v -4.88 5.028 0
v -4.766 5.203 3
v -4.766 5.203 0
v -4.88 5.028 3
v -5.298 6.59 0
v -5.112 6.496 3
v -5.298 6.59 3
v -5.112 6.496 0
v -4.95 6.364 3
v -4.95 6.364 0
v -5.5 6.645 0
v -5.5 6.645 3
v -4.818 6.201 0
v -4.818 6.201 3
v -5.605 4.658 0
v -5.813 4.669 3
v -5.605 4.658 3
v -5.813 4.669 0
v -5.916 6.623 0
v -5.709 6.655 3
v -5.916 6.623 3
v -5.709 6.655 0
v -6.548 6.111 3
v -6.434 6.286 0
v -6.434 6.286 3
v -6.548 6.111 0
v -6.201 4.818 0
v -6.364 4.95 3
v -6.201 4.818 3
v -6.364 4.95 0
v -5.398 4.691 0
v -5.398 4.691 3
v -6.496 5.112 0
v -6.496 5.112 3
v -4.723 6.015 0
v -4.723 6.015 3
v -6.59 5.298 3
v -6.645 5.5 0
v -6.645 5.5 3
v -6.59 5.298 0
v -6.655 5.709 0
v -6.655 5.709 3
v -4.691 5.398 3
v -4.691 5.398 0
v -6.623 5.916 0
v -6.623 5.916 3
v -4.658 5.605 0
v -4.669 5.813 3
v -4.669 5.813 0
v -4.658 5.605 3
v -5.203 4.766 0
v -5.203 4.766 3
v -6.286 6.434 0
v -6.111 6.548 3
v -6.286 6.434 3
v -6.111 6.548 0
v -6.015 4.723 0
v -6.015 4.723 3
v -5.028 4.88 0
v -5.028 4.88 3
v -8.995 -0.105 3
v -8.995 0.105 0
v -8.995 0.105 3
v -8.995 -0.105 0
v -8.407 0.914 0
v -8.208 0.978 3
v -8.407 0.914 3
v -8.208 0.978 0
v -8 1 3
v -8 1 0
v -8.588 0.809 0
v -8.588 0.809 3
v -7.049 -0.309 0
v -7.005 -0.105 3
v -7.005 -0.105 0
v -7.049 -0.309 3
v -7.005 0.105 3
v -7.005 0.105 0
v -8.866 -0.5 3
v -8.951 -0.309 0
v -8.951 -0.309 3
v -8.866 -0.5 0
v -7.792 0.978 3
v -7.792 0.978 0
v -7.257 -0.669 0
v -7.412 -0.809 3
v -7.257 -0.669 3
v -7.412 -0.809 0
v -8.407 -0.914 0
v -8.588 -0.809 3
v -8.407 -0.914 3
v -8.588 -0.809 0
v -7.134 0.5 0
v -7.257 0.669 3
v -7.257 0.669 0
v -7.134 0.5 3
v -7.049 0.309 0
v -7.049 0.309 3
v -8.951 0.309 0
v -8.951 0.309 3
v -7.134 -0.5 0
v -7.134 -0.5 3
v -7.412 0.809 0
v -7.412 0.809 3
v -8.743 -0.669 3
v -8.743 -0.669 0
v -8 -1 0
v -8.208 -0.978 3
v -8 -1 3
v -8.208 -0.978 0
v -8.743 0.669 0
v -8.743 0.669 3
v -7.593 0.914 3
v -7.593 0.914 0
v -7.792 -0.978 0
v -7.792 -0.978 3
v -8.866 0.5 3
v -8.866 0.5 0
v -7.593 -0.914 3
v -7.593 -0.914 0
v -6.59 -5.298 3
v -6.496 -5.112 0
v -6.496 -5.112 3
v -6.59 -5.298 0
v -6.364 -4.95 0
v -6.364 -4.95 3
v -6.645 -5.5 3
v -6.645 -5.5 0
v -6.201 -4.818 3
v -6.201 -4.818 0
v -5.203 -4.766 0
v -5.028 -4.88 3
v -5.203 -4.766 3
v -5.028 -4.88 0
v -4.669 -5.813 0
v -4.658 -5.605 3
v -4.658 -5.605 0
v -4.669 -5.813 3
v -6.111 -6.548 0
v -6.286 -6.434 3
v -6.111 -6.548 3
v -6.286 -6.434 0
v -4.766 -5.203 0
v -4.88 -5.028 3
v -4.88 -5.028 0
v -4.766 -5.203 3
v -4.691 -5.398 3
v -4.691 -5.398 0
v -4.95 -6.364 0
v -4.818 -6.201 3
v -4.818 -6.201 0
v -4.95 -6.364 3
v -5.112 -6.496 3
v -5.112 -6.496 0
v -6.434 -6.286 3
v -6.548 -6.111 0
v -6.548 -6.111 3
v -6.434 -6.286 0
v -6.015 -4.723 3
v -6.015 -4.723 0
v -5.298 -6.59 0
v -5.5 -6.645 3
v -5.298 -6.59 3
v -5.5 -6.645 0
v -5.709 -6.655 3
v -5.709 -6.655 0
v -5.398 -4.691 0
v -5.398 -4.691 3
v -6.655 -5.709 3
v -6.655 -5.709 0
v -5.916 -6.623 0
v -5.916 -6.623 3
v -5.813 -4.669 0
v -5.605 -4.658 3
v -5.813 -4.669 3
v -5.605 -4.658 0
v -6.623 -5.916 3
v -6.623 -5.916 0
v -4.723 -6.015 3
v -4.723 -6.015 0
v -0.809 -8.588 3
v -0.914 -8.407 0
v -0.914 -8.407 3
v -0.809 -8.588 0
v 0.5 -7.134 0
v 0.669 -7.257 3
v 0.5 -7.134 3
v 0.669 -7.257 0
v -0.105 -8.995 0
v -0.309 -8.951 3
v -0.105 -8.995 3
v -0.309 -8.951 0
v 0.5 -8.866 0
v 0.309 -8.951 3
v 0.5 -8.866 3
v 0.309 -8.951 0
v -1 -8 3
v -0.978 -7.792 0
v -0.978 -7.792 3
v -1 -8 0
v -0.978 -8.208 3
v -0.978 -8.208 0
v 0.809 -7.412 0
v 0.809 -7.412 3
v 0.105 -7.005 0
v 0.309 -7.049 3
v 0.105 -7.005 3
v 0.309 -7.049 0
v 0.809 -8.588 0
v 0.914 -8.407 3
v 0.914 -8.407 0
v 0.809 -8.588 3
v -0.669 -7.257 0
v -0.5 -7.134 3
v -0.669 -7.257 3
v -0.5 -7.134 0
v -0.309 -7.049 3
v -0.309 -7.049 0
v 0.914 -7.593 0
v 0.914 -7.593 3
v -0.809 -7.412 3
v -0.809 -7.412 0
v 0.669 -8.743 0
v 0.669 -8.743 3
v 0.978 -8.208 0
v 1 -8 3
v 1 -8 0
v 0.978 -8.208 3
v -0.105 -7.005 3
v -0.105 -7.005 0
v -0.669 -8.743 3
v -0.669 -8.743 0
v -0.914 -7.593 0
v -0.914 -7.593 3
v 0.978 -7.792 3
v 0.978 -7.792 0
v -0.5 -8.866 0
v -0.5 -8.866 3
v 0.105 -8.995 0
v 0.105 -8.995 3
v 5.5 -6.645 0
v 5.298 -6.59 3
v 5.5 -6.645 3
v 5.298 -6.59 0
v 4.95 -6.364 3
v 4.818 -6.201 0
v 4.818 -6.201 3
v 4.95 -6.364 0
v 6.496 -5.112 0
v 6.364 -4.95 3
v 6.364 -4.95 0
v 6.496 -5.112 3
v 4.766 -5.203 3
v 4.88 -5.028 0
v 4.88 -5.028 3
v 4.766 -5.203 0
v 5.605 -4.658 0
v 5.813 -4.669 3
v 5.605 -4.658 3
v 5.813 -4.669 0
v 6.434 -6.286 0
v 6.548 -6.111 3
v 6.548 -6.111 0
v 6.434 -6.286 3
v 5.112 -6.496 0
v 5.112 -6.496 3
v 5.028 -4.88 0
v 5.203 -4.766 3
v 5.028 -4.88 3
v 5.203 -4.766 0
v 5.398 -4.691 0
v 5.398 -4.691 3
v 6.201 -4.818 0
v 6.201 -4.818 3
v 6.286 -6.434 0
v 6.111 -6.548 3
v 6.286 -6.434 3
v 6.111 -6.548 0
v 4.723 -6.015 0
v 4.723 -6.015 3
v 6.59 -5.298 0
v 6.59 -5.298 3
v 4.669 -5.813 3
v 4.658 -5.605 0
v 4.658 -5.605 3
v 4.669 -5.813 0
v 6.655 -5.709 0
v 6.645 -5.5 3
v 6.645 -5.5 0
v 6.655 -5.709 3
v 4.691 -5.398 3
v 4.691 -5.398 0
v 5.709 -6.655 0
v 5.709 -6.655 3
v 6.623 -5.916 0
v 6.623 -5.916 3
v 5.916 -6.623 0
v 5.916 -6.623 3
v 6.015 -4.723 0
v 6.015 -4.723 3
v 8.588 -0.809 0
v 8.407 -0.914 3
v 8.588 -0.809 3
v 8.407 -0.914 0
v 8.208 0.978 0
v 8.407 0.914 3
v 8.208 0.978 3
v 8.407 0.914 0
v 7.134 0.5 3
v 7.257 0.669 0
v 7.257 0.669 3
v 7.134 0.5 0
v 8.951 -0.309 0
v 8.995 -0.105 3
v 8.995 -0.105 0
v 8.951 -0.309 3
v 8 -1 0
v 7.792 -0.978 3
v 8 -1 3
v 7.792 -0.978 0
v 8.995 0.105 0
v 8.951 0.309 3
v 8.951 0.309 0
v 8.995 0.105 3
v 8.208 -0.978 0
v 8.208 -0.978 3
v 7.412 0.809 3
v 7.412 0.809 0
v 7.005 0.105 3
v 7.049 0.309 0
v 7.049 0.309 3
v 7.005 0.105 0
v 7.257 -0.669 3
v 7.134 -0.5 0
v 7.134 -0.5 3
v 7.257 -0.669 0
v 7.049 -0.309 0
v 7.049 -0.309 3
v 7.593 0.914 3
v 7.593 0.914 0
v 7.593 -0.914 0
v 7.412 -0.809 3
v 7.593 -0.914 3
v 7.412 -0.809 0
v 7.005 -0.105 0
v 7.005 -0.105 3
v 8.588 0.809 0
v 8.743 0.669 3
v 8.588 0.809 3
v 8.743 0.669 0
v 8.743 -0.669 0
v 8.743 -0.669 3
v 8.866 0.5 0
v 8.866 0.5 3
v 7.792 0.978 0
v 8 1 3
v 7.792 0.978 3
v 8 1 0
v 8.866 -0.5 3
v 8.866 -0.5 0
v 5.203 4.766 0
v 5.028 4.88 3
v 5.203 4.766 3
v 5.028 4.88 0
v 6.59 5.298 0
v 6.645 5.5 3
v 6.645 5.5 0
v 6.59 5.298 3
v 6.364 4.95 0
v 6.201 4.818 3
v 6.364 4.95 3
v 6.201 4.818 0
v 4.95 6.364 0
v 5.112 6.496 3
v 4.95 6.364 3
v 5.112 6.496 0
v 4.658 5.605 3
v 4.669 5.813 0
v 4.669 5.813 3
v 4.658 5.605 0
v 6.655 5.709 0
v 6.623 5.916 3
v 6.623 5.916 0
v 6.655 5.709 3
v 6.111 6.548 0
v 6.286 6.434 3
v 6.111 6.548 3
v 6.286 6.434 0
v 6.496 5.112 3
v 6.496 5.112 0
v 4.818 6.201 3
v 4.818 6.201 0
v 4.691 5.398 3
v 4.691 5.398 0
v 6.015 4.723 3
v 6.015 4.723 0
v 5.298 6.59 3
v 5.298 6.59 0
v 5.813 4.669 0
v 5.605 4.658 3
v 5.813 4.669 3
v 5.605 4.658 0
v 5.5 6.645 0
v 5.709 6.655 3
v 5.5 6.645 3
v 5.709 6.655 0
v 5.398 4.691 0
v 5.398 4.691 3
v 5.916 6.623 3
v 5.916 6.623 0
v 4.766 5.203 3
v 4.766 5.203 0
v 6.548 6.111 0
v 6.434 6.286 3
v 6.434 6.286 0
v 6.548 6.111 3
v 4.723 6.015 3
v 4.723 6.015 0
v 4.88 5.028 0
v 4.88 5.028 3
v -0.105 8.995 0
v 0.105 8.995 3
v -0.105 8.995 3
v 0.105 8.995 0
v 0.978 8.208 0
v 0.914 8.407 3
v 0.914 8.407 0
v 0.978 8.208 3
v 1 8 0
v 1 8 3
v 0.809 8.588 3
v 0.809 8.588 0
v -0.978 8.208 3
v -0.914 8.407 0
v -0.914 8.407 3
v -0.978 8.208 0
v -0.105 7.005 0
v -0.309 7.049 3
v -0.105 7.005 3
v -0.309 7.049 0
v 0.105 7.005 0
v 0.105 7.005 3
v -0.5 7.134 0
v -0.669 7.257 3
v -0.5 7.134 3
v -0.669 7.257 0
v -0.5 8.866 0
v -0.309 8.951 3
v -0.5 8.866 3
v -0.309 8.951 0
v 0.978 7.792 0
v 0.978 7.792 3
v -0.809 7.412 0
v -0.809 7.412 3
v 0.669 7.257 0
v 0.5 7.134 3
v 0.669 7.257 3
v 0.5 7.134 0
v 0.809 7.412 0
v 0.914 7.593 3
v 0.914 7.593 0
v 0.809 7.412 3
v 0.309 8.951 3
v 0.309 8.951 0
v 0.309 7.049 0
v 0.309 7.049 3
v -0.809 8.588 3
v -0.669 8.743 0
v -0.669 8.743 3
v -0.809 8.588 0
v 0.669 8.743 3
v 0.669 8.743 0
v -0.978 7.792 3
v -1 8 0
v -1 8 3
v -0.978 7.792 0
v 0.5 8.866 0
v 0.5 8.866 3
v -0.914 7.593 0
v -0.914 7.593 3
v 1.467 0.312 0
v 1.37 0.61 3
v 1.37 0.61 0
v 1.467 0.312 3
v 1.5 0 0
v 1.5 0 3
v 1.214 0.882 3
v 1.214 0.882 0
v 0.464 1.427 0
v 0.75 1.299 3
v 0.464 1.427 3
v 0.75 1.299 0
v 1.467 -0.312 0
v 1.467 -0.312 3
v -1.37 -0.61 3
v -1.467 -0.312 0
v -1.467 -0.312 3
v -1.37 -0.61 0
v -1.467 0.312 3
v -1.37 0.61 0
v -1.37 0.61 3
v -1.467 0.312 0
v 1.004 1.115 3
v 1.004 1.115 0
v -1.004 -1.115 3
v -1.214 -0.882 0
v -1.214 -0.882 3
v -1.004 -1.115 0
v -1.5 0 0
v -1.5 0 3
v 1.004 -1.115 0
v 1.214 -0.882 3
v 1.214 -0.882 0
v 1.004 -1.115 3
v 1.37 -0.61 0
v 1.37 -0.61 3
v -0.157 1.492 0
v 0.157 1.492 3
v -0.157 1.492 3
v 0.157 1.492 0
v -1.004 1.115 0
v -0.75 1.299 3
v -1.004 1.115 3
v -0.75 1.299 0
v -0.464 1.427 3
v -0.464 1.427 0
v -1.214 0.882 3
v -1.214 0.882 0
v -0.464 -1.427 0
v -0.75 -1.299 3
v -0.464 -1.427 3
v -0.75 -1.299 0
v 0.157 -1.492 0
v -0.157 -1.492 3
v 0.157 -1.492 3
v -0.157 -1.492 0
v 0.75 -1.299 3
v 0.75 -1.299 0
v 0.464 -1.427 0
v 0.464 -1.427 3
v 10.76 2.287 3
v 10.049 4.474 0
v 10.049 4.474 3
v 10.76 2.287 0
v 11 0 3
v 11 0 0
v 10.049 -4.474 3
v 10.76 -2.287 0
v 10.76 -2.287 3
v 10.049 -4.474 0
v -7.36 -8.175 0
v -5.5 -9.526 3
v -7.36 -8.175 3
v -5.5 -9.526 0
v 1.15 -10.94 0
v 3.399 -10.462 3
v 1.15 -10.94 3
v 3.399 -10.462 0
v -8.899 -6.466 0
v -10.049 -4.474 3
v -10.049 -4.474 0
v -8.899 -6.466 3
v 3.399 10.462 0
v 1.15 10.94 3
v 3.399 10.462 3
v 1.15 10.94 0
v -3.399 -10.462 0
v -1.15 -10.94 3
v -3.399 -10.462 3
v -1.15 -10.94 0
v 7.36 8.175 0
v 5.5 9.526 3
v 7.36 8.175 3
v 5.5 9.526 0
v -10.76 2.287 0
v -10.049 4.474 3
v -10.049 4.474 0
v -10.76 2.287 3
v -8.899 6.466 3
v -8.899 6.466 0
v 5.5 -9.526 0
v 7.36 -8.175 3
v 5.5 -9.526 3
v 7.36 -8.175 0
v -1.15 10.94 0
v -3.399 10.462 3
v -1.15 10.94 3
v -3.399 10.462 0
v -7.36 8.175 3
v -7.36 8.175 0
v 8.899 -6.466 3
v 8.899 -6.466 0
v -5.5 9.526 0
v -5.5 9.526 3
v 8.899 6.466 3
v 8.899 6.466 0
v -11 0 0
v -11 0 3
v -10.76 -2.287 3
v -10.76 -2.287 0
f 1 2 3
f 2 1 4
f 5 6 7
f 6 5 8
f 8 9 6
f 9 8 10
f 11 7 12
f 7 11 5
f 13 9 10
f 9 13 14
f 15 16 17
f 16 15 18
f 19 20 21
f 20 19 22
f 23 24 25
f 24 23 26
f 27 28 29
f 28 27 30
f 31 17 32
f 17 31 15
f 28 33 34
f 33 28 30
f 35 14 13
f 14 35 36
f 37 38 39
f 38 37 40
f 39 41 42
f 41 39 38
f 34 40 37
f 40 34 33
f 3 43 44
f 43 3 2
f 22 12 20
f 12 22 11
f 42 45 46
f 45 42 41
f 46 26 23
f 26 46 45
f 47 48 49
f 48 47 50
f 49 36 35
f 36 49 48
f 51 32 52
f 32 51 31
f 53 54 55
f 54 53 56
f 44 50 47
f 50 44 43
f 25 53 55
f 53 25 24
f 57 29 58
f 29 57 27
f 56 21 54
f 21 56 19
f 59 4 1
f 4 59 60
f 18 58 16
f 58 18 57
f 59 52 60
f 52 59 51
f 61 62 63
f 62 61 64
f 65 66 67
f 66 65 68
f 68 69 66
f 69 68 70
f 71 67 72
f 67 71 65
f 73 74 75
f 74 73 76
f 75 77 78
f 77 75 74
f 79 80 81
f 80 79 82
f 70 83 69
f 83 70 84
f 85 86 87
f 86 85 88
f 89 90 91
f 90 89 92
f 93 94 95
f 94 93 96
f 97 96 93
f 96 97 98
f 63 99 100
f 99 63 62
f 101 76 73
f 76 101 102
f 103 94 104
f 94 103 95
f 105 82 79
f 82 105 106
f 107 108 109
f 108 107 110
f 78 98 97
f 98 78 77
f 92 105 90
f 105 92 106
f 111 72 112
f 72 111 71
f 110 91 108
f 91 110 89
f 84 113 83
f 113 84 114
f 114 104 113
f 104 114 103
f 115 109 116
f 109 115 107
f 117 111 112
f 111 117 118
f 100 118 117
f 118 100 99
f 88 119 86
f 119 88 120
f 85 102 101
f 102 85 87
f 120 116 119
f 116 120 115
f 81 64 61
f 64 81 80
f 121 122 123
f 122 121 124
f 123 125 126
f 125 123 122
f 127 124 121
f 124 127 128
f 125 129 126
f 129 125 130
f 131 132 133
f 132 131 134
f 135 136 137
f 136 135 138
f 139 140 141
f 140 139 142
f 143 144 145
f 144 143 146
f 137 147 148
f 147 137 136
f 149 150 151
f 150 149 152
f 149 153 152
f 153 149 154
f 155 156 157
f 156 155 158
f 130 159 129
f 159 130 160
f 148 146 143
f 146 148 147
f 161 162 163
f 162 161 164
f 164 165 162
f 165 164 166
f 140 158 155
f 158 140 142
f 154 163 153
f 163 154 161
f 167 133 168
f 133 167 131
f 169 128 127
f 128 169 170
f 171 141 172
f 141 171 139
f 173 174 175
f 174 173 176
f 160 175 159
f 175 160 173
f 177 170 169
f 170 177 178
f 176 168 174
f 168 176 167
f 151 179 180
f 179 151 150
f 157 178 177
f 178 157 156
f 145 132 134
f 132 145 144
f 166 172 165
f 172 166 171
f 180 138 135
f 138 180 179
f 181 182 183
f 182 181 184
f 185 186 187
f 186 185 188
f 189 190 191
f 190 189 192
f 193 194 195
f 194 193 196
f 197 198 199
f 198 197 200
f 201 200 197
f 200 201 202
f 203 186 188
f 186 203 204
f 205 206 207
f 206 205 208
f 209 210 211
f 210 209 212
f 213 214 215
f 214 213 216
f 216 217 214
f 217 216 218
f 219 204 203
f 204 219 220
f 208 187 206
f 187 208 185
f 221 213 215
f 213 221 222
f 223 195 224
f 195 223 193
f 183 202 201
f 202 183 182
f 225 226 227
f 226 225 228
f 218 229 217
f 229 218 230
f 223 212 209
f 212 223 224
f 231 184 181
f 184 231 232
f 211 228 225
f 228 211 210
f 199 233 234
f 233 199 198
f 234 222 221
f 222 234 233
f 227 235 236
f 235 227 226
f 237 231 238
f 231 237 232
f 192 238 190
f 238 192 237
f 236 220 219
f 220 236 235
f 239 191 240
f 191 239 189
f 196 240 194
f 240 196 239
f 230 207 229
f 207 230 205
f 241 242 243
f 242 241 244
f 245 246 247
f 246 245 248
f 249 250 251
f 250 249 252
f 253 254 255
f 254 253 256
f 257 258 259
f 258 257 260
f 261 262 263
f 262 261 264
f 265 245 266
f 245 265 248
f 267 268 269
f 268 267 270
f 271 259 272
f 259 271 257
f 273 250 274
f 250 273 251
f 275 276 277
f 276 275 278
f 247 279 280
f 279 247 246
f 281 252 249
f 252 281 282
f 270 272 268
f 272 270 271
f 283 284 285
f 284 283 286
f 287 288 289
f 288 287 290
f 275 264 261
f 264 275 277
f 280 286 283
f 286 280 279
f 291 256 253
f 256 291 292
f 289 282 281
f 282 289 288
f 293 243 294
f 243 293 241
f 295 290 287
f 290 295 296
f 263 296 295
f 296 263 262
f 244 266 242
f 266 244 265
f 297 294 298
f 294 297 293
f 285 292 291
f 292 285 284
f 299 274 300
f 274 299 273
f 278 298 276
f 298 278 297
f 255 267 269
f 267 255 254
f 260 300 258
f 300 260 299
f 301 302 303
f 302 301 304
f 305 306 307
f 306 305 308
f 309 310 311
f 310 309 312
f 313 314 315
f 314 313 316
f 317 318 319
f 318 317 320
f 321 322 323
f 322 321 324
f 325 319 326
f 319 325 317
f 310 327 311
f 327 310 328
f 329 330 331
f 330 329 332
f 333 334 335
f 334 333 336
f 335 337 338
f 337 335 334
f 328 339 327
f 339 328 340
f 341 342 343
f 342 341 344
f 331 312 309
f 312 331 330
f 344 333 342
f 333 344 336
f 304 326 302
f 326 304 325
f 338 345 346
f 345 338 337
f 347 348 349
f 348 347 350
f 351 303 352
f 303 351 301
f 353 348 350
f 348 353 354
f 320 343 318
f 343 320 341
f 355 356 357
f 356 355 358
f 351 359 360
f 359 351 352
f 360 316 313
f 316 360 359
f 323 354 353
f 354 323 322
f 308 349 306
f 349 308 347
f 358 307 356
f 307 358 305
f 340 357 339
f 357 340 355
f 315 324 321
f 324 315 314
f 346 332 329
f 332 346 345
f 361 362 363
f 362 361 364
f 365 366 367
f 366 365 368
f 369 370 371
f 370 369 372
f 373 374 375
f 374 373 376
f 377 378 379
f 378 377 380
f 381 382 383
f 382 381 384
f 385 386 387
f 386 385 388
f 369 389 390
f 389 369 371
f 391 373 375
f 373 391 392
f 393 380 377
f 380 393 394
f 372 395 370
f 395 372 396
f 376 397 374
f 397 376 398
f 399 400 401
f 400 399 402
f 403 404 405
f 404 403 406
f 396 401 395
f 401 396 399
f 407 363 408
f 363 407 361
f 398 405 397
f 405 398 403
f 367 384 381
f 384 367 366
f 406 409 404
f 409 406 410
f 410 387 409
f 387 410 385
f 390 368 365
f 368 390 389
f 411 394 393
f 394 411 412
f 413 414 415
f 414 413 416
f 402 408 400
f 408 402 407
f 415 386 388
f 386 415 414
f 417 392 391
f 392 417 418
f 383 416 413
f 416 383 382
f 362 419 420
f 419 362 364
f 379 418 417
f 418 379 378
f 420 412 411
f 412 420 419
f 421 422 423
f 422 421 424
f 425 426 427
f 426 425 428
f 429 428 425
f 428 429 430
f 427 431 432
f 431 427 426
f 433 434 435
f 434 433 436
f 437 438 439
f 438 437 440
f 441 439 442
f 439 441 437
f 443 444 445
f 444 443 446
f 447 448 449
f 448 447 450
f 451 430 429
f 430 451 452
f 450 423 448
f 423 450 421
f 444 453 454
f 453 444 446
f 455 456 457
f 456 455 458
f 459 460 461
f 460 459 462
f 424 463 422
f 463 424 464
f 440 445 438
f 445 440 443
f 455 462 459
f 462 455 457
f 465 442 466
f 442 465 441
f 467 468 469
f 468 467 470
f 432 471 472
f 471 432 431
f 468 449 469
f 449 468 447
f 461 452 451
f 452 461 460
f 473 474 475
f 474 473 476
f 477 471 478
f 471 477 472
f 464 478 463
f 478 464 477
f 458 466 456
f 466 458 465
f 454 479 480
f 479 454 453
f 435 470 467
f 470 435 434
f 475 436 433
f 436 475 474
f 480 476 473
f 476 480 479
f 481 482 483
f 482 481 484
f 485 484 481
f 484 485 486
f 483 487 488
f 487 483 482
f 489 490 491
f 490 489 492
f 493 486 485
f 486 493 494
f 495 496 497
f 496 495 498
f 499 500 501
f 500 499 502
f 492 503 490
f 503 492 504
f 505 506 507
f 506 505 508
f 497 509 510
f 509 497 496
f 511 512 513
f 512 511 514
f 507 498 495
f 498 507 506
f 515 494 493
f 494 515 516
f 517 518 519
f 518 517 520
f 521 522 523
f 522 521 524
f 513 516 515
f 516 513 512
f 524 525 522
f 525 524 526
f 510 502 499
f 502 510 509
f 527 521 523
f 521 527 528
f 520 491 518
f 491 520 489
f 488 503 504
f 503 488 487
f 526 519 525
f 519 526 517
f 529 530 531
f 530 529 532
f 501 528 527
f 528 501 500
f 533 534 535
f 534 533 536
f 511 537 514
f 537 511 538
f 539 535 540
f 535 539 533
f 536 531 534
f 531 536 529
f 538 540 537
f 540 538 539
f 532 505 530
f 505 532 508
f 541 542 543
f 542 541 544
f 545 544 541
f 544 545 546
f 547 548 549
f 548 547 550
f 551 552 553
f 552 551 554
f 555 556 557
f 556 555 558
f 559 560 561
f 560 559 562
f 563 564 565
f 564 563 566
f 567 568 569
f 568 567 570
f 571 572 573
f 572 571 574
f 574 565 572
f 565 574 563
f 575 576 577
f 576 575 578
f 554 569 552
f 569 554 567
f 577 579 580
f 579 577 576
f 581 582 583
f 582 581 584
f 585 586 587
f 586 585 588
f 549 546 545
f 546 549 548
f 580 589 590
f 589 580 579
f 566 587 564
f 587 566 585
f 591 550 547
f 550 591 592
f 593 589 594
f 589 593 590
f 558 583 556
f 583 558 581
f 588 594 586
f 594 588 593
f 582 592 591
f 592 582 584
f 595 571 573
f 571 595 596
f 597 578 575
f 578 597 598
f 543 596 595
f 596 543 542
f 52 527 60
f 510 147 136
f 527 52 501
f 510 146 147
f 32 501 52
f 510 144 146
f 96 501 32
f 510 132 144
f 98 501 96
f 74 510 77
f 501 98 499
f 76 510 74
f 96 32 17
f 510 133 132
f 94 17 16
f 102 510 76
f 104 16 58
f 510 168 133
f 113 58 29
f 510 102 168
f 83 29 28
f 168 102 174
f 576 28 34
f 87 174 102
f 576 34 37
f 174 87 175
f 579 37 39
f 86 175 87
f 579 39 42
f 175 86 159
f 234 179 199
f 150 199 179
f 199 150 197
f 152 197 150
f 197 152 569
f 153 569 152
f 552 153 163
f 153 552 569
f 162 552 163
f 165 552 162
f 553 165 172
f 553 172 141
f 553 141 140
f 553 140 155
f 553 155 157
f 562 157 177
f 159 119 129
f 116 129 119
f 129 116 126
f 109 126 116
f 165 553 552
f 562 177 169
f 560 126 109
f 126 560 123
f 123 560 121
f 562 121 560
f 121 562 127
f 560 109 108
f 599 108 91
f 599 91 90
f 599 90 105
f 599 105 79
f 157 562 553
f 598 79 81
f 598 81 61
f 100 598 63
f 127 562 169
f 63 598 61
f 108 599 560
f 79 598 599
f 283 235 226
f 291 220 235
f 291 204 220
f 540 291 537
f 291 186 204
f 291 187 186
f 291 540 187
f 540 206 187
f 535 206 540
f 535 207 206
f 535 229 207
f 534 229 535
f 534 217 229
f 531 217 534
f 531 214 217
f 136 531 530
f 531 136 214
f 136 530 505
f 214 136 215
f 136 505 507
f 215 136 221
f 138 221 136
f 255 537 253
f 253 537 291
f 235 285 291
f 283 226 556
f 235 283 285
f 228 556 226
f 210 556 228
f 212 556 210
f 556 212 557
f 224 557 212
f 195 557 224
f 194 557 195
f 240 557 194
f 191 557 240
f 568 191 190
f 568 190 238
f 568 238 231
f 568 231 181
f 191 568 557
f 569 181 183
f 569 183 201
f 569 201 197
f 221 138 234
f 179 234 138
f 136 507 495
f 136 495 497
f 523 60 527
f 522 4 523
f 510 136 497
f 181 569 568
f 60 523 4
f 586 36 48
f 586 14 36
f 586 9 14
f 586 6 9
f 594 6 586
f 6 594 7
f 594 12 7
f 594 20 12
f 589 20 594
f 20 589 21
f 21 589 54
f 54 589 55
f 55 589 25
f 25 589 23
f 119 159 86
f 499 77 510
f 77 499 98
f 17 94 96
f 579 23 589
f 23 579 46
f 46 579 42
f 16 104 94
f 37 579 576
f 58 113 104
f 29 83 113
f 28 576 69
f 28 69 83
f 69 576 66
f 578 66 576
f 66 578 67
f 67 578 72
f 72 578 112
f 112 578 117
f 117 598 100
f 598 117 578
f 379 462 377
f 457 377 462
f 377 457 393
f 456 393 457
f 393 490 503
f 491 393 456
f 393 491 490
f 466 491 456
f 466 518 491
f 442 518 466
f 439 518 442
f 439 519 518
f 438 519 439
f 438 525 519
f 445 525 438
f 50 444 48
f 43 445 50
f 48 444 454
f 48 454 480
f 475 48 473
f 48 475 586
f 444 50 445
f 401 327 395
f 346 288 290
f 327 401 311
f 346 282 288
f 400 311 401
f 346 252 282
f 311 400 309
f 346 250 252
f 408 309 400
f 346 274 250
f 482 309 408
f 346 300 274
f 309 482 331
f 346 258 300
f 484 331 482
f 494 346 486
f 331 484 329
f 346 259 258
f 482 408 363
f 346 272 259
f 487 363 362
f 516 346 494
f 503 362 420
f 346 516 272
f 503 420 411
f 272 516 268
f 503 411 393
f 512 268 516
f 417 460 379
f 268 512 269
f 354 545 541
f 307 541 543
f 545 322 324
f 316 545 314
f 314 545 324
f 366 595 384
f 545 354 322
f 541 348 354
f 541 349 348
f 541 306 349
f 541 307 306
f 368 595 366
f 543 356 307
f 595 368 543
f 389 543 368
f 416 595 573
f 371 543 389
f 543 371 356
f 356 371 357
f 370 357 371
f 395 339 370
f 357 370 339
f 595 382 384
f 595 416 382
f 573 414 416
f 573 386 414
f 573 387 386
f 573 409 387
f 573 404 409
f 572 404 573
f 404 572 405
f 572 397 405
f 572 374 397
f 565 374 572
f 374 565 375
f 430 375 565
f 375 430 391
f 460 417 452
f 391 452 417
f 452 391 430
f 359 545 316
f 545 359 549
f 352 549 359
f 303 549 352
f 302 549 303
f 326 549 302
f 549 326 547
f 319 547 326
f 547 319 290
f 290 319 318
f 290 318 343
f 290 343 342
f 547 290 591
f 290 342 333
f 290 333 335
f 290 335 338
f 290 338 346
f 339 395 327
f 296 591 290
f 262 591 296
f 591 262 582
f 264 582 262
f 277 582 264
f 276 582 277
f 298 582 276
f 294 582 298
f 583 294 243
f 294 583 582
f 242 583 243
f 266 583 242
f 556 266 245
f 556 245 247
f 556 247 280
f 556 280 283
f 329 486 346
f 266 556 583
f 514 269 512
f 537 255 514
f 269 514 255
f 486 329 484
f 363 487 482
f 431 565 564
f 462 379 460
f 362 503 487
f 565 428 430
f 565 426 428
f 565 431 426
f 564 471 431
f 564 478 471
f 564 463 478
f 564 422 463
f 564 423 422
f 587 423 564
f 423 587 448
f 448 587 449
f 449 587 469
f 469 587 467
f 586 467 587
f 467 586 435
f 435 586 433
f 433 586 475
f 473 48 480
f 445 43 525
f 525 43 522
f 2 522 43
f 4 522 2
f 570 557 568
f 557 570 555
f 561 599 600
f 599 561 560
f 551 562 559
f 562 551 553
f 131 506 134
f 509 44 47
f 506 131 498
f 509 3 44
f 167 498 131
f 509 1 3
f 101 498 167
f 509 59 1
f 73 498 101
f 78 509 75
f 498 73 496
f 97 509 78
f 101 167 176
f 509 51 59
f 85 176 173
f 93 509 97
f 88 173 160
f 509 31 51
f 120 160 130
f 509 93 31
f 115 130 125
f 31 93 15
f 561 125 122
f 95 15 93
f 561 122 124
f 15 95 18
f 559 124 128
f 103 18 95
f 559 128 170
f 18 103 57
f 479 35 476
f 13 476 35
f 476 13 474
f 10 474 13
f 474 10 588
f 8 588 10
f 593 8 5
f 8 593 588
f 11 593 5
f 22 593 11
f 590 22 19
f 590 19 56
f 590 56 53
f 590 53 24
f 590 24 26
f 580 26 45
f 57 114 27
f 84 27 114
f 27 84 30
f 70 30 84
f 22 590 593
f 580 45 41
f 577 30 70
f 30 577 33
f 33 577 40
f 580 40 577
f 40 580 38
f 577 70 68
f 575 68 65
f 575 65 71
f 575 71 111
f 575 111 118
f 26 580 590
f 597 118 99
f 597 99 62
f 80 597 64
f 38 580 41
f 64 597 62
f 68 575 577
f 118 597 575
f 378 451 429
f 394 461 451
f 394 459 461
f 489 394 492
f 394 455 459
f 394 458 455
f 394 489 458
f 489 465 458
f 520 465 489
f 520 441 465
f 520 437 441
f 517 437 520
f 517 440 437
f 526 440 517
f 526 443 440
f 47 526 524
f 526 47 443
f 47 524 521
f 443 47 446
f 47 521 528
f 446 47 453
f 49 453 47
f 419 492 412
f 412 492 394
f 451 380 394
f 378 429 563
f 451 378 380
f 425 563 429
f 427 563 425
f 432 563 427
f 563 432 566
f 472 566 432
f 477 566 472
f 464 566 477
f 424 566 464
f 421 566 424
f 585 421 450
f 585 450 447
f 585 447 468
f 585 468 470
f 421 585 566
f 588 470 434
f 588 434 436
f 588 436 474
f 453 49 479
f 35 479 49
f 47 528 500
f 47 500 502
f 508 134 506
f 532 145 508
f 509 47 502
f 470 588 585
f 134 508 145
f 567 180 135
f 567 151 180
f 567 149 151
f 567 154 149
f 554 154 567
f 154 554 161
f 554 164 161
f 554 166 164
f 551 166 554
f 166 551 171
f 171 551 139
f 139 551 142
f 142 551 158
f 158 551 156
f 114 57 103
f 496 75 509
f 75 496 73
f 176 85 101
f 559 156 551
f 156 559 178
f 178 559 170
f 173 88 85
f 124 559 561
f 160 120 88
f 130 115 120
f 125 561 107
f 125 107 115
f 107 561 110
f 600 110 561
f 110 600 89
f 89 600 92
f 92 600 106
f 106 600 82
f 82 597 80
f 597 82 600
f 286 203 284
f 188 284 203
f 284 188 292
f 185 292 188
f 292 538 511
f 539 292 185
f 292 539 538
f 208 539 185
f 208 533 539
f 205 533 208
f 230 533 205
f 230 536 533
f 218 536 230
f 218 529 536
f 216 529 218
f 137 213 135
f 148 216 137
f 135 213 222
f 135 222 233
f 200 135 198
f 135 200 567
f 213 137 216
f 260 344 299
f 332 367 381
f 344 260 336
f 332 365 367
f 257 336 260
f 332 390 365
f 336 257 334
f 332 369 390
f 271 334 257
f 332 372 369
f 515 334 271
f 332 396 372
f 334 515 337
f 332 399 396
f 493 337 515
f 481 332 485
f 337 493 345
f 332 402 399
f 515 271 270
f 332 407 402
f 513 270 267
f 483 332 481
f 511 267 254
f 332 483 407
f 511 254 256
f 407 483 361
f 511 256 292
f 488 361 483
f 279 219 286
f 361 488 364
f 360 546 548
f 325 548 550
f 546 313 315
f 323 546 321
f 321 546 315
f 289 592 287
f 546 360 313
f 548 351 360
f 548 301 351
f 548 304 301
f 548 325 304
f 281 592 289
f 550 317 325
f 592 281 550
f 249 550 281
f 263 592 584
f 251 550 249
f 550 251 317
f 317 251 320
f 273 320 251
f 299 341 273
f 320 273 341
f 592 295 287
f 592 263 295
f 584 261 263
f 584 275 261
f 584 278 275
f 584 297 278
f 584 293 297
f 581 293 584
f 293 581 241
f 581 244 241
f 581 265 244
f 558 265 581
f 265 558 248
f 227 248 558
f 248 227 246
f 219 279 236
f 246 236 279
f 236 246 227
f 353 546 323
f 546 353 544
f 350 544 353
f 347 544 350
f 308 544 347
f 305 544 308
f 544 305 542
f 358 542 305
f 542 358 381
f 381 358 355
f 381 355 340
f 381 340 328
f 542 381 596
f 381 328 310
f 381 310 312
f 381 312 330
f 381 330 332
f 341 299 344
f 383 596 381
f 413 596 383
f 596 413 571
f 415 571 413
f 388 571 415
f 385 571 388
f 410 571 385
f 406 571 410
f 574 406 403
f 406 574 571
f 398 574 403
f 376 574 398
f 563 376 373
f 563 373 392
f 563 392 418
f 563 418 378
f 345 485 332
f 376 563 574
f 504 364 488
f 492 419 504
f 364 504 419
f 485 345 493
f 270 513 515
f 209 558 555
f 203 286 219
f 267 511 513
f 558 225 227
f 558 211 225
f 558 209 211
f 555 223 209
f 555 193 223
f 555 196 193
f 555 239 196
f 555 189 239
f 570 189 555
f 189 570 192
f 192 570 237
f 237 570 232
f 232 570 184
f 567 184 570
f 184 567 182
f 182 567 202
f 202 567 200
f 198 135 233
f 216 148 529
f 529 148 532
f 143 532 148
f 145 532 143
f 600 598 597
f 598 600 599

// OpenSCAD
Collisions = false;
$fn=30;

module mx28_arm_holes()
{
    for (i=[1:8]) {
                rotate([0,0,i*360/8])
                translate([0,8,0])
                    cylinder(d=2, h=10, center=true);
            }
            
            cylinder(d=3, h=10, center=true);
}

//:Model "MX-28 Arm" [0.5,0.5,0.5]
module mx28_arm()
{
    if (!Collisions) {
        color([0.5,0.5,0.5])
        difference() {
            cylinder(d=22, h=3);
            
            mx28_arm_holes();
        }
    }
}

mx28_arm();
